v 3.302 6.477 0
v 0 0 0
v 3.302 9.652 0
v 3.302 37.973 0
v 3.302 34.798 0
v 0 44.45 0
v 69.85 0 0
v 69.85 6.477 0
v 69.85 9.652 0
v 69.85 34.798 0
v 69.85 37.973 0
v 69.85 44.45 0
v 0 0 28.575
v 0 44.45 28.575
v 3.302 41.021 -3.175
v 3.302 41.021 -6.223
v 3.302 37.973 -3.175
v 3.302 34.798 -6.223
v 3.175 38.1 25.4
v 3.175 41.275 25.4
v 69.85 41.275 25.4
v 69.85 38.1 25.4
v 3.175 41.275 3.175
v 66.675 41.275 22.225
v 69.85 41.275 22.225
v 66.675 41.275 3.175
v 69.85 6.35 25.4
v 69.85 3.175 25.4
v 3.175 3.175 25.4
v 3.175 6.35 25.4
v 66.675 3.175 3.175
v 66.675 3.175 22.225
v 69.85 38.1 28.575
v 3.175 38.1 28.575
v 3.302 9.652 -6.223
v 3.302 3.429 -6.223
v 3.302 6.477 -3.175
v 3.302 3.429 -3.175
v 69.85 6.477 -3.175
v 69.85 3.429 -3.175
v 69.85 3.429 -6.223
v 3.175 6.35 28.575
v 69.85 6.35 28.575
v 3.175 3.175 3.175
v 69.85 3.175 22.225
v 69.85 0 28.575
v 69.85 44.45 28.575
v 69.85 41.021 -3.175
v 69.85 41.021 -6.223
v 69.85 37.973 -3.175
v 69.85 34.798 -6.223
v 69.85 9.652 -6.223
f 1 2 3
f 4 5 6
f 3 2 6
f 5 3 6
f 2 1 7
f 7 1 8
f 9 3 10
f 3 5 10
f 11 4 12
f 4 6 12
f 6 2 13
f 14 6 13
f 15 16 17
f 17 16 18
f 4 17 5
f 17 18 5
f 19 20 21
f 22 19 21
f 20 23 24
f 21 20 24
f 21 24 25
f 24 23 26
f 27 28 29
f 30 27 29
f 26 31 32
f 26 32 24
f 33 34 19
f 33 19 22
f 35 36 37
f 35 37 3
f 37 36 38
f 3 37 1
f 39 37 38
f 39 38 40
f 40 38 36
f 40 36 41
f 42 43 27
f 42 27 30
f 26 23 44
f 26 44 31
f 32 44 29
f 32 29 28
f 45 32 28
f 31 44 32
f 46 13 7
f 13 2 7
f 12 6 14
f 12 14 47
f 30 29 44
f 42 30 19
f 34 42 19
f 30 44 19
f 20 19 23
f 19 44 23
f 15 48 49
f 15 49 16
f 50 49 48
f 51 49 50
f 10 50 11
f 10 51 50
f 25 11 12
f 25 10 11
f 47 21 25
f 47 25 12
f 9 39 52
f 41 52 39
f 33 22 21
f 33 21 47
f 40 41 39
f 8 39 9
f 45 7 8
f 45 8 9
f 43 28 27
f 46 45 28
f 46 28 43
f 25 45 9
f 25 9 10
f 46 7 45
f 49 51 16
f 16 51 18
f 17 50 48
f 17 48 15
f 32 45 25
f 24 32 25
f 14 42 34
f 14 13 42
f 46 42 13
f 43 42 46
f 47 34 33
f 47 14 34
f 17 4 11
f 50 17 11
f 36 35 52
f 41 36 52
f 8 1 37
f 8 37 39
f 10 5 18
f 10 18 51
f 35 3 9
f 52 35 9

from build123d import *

# Parameters (mm, degrees)
F0_W      = 69.85
F0_H      = 44.45
F1_DEPTH  = 3.175
F2_W      = 69.85
F2_H      = 44.45
F2_W_2    = 63.5
F2_H_2    = 38.1
F3_DEPTH  = 25.4
F4_W      = 69.85
F4_H      = 3.175
F5_DEPTH  = 6.223
F6_W      = 69.85
F6_H      = 3.048
F7_DEPTH  = 3.048
F8_W      = 69.85
F8_H      = 3.048
F9_DEPTH  = 3.048
F10_W     = 63.5
F10_H     = 3.175
F11_DEPTH = 3.175
F12_W     = 63.5
F12_H     = 3.175
F13_DEPTH = 3.175
F14_W     = 31.75
F14_H     = 3.175
F15_DEPTH = 3.175
F16_W     = 3.302
F16_H     = 6.223
F17_DEPTH = 38.1


with BuildPart() as f1:
    # F0 (on Top) → F1 (new body)
    with BuildSketch(Plane.XY):
        with Locations((34.925, 22.225)):
            Rectangle(F0_W, F0_H)
    extrude(amount=F1_DEPTH)

    # F2 (on face) → F3 (join)
    with BuildSketch(Plane.XY.offset(3.175)):
        with Locations((34.925, 22.225)):
            Rectangle(F2_W, F2_H)
        with Locations((34.925, 22.225)):
            Rectangle(F2_W_2, F2_H_2, mode=Mode.SUBTRACT)
    extrude(amount=F3_DEPTH)

    # F4 (on face) → F5 (join)
    with BuildSketch(Plane(origin=(0, 0, 0), x_dir=(1, 0, 0), z_dir=(0, 0, -1))):
        with Locations((34.925, -8.0645)):
            Rectangle(F4_W, F4_H)
        with Locations((34.925, -36.3855)):
            Rectangle(F4_W, F4_H)
    extrude(amount=F5_DEPTH)

    # F6 (on face) → F7 (join)
    with BuildSketch(Plane.XZ.offset(-6.477)):
        with Locations((34.925, -4.699)):
            Rectangle(F6_W, F6_H)
    extrude(amount=F7_DEPTH)

    # F8 (on face) → F9 (join)
    with BuildSketch(Plane(origin=(0, 37.973, 0), x_dir=(-1, 0, 0), z_dir=(0, 1, 0))):
        with Locations((-34.925, -4.699)):
            Rectangle(F8_W, F8_H)
    extrude(amount=F9_DEPTH)

    # F10 (on face) → F11 (join)
    with BuildSketch(Plane(origin=(0, 3.175, 0), x_dir=(-1, 0, 0), z_dir=(0, 1, 0))):
        with Locations((-34.925, 26.9875)):
            Rectangle(F10_W, F10_H)
    extrude(amount=F11_DEPTH)

    # F12 (on face) → F13 (join)
    with BuildSketch(Plane.XZ.offset(-41.275)):
        with Locations((34.925, 26.9875)):
            Rectangle(F12_W, F12_H)
    extrude(amount=F13_DEPTH)

    # F14 (on face) → F15 (cut, through all)
    with BuildSketch(Plane.YZ.offset(69.85)):
        Polygon((38.1, 25.4), (6.35, 25.4), (3.175, 25.4), (3.175, 22.225), (41.275, 22.225), (41.275, 25.4), align=None)
        with Locations((22.225, 26.9875)):
            Rectangle(F14_W, F14_H)
    extrude(amount=-F15_DEPTH, mode=Mode.SUBTRACT)

    # F16 (on face) → F17 (cut)
    with BuildSketch(Plane.XZ.offset(-3.429)):
        with Locations((1.651, -3.1115)):
            Rectangle(F16_W, F16_H)
    extrude(amount=-F17_DEPTH, mode=Mode.SUBTRACT)


solid = f1.part
